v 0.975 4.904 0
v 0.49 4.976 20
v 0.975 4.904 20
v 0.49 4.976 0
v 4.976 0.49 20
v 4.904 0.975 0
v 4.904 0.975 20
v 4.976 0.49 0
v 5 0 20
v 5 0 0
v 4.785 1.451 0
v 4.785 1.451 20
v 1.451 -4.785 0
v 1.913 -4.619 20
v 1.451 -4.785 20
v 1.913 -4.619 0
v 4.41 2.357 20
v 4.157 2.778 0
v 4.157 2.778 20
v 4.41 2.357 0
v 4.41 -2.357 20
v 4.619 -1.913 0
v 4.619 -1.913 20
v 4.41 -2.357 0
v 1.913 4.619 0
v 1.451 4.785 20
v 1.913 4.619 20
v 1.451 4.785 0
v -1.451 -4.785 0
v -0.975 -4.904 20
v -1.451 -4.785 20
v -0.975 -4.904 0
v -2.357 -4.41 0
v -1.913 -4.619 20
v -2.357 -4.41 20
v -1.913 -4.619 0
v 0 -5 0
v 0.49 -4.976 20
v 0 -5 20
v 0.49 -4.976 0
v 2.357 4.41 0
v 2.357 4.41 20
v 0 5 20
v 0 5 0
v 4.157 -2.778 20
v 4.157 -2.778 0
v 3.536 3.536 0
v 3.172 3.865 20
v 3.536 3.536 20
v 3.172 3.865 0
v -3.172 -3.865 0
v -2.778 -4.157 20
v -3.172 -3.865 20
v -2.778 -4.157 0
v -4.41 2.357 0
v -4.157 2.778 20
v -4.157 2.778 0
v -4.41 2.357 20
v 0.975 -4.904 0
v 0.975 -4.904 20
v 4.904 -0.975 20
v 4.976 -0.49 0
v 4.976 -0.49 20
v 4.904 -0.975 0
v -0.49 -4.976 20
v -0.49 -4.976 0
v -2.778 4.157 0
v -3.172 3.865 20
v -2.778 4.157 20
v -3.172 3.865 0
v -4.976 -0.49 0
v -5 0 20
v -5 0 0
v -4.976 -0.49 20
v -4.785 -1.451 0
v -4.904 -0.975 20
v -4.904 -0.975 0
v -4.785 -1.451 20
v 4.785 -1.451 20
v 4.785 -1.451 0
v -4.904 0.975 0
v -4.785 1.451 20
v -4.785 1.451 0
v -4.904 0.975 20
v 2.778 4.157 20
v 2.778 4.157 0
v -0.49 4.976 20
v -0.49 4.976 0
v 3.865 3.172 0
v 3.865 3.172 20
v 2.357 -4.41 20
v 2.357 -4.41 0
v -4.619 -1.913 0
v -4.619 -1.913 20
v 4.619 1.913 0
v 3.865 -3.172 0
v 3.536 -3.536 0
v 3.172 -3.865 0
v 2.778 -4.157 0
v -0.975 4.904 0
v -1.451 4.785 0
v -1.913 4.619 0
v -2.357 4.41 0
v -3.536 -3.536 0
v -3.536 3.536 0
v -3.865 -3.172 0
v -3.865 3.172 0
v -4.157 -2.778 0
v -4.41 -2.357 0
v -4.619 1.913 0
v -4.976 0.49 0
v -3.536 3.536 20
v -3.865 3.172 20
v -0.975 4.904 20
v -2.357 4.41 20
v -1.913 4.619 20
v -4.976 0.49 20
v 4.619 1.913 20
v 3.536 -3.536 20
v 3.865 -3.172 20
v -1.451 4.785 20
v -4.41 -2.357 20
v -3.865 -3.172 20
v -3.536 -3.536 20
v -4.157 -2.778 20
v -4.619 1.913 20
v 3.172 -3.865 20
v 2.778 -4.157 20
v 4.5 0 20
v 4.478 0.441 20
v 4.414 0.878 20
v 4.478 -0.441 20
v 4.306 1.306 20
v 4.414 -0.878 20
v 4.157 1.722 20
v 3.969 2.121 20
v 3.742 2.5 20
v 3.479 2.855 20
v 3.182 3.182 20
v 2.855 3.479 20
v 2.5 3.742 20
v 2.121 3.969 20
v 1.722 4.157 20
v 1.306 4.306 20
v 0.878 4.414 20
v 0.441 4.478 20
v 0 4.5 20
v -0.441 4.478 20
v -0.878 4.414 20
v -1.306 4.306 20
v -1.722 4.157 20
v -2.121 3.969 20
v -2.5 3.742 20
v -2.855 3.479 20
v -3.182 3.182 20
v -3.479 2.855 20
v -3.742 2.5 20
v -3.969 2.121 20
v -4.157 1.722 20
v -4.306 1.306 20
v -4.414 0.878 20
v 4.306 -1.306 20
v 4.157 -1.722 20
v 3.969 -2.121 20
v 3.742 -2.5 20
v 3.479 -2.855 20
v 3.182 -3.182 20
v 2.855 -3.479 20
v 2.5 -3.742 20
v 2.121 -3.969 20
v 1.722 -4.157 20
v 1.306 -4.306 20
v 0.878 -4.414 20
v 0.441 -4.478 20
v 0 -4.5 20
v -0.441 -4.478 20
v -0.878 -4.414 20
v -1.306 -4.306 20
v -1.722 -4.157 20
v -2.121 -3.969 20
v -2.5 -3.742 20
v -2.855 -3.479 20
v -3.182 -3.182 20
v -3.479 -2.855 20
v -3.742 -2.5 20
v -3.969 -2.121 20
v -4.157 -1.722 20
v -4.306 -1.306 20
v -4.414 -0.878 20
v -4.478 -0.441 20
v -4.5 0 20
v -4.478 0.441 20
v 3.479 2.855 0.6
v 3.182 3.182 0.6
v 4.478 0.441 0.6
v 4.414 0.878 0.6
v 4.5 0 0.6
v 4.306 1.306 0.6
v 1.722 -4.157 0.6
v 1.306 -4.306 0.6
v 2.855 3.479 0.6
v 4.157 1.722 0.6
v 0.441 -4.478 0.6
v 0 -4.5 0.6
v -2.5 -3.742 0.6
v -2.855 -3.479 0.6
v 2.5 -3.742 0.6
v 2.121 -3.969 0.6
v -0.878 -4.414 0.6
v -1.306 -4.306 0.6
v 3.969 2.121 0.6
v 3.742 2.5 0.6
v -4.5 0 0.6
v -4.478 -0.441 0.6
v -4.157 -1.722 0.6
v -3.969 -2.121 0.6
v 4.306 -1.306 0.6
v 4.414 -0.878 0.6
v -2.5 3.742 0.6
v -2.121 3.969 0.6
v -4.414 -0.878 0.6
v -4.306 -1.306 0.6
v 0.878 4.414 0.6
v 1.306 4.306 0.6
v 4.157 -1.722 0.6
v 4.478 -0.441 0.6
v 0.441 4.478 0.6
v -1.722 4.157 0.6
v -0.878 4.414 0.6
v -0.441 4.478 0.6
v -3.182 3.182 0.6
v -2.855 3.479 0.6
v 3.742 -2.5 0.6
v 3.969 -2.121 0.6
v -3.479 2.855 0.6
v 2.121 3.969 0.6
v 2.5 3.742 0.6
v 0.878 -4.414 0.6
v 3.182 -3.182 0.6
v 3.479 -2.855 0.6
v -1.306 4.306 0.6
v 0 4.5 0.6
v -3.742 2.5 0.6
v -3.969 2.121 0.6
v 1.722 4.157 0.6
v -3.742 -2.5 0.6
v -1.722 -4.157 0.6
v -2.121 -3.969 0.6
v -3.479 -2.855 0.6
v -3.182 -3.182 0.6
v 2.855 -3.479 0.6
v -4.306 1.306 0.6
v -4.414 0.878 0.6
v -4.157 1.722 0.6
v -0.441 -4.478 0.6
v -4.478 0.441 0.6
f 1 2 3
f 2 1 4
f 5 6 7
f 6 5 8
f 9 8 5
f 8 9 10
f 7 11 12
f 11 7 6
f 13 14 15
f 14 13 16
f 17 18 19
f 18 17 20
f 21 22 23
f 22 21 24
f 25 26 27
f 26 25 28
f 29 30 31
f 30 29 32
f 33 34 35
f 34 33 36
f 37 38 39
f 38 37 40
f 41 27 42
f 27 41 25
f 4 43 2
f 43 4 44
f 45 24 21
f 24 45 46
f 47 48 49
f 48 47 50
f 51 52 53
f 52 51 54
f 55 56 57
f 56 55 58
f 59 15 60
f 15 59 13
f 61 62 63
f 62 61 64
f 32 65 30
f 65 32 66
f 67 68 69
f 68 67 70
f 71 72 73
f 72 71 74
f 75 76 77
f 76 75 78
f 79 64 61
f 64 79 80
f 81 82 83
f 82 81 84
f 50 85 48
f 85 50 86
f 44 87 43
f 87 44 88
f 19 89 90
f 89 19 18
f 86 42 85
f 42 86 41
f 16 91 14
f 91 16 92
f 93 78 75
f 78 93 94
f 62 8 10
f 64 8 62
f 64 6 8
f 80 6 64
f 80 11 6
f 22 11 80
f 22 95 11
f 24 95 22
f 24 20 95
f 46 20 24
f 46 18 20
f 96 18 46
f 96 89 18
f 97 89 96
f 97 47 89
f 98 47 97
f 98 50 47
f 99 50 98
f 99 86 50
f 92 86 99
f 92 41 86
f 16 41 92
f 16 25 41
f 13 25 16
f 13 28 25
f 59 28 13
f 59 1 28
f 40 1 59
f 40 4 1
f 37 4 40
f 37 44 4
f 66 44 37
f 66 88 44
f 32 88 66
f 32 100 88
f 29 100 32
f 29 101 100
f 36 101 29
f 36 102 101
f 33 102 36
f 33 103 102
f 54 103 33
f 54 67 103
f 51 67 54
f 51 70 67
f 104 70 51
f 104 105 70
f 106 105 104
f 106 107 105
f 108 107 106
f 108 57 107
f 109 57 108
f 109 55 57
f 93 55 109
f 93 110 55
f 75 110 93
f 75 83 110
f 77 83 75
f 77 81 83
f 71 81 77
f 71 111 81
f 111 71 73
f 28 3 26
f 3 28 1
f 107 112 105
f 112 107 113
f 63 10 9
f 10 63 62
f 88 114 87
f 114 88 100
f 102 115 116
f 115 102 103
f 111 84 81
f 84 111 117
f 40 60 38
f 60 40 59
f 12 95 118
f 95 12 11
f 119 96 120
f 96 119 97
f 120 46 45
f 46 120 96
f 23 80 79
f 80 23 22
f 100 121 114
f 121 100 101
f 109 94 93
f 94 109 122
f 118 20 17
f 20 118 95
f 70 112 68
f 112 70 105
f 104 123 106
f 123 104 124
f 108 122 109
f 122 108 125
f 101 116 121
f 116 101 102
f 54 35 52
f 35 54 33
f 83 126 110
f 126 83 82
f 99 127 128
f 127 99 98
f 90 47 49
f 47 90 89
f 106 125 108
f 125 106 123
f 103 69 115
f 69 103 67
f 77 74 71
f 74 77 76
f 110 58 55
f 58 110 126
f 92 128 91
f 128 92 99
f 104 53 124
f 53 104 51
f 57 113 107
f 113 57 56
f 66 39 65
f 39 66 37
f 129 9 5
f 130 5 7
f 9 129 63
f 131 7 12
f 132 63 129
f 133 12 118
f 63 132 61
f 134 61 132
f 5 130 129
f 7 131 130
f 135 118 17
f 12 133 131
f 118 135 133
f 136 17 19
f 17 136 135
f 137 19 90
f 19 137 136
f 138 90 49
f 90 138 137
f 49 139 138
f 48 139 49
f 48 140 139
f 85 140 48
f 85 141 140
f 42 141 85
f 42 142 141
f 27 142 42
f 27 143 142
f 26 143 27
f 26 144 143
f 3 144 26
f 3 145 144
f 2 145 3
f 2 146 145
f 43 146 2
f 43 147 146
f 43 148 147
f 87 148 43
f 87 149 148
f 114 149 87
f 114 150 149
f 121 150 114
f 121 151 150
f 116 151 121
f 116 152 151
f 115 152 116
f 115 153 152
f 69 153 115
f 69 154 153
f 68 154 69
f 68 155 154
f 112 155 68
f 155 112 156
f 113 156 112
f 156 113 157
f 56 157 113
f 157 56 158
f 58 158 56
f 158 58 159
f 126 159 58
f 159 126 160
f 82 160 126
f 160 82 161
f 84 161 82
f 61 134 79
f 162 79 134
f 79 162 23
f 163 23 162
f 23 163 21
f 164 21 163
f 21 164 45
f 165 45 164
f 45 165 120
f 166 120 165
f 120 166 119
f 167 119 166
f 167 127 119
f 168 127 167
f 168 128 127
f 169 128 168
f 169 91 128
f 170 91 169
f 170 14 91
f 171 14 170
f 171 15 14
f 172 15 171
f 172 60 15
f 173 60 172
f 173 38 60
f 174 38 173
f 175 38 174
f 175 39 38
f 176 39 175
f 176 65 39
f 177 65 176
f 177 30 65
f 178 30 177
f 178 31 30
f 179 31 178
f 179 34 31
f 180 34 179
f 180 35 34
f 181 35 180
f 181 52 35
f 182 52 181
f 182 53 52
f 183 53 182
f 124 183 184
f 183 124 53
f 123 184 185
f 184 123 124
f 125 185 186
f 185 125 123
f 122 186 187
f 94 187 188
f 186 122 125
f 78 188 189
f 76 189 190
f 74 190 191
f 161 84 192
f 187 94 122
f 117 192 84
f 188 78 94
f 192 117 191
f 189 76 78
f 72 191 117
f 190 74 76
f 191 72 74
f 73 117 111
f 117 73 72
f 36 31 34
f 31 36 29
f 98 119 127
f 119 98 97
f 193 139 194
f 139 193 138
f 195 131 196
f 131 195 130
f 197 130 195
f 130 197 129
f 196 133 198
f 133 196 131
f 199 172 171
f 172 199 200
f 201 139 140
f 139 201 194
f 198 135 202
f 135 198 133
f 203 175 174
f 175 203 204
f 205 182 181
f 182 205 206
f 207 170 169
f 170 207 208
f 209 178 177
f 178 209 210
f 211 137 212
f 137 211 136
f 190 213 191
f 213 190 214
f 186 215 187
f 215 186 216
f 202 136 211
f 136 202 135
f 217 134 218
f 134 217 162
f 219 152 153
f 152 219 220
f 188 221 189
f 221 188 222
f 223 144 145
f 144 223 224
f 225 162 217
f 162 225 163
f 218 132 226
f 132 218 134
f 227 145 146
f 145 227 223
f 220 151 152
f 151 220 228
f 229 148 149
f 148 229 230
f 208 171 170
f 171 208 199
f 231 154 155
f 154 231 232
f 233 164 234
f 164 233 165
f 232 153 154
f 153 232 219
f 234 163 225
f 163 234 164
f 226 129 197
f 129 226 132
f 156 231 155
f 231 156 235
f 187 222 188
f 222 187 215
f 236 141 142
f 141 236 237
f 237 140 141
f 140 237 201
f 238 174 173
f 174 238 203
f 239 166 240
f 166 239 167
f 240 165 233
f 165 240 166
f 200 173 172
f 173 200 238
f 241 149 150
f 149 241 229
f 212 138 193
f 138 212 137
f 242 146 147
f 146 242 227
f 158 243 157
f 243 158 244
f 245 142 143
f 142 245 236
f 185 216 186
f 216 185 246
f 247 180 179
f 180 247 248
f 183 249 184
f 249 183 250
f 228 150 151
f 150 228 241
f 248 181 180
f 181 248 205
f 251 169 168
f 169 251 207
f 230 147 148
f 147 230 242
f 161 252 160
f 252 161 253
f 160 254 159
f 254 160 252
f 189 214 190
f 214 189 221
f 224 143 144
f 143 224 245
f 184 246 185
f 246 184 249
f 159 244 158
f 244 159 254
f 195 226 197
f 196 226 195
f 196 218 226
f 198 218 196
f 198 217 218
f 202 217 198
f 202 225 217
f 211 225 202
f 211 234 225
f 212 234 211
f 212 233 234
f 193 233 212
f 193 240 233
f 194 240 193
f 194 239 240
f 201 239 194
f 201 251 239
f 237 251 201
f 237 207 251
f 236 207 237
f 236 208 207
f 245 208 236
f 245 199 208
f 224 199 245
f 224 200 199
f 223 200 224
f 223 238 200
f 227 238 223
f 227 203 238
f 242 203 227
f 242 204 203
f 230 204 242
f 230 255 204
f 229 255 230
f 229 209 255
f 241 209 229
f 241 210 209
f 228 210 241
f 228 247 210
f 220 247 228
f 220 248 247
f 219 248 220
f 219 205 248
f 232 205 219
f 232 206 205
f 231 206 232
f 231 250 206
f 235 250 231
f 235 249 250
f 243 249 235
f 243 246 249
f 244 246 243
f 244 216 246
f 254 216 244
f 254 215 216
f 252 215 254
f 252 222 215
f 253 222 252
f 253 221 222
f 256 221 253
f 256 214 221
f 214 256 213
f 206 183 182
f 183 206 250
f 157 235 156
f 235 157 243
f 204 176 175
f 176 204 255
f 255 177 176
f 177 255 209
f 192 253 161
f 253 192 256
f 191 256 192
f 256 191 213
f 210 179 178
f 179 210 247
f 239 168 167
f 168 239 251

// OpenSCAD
// A sacrificial post to slow allow small layers to coll off.
// Scale verticaly ONLY in the slicing program to the height of the 
// printed part and place it at a far corner of the building plate.

$fn=64;

eps1 = 0.01;
eps2 = 2 * eps1;

// Height
h = 20;
// Diameter
d = 10;
// Adjust wall thickness to be sliced to one vertical layer.
wall = 0.5;
// Base height. Used to improve first layer adhesion.
base = 0.6;

difference() {
  cylinder(d=d, h=h);
  translate([0, 0, base]) cylinder(d=d-2*wall, h=h);
}
